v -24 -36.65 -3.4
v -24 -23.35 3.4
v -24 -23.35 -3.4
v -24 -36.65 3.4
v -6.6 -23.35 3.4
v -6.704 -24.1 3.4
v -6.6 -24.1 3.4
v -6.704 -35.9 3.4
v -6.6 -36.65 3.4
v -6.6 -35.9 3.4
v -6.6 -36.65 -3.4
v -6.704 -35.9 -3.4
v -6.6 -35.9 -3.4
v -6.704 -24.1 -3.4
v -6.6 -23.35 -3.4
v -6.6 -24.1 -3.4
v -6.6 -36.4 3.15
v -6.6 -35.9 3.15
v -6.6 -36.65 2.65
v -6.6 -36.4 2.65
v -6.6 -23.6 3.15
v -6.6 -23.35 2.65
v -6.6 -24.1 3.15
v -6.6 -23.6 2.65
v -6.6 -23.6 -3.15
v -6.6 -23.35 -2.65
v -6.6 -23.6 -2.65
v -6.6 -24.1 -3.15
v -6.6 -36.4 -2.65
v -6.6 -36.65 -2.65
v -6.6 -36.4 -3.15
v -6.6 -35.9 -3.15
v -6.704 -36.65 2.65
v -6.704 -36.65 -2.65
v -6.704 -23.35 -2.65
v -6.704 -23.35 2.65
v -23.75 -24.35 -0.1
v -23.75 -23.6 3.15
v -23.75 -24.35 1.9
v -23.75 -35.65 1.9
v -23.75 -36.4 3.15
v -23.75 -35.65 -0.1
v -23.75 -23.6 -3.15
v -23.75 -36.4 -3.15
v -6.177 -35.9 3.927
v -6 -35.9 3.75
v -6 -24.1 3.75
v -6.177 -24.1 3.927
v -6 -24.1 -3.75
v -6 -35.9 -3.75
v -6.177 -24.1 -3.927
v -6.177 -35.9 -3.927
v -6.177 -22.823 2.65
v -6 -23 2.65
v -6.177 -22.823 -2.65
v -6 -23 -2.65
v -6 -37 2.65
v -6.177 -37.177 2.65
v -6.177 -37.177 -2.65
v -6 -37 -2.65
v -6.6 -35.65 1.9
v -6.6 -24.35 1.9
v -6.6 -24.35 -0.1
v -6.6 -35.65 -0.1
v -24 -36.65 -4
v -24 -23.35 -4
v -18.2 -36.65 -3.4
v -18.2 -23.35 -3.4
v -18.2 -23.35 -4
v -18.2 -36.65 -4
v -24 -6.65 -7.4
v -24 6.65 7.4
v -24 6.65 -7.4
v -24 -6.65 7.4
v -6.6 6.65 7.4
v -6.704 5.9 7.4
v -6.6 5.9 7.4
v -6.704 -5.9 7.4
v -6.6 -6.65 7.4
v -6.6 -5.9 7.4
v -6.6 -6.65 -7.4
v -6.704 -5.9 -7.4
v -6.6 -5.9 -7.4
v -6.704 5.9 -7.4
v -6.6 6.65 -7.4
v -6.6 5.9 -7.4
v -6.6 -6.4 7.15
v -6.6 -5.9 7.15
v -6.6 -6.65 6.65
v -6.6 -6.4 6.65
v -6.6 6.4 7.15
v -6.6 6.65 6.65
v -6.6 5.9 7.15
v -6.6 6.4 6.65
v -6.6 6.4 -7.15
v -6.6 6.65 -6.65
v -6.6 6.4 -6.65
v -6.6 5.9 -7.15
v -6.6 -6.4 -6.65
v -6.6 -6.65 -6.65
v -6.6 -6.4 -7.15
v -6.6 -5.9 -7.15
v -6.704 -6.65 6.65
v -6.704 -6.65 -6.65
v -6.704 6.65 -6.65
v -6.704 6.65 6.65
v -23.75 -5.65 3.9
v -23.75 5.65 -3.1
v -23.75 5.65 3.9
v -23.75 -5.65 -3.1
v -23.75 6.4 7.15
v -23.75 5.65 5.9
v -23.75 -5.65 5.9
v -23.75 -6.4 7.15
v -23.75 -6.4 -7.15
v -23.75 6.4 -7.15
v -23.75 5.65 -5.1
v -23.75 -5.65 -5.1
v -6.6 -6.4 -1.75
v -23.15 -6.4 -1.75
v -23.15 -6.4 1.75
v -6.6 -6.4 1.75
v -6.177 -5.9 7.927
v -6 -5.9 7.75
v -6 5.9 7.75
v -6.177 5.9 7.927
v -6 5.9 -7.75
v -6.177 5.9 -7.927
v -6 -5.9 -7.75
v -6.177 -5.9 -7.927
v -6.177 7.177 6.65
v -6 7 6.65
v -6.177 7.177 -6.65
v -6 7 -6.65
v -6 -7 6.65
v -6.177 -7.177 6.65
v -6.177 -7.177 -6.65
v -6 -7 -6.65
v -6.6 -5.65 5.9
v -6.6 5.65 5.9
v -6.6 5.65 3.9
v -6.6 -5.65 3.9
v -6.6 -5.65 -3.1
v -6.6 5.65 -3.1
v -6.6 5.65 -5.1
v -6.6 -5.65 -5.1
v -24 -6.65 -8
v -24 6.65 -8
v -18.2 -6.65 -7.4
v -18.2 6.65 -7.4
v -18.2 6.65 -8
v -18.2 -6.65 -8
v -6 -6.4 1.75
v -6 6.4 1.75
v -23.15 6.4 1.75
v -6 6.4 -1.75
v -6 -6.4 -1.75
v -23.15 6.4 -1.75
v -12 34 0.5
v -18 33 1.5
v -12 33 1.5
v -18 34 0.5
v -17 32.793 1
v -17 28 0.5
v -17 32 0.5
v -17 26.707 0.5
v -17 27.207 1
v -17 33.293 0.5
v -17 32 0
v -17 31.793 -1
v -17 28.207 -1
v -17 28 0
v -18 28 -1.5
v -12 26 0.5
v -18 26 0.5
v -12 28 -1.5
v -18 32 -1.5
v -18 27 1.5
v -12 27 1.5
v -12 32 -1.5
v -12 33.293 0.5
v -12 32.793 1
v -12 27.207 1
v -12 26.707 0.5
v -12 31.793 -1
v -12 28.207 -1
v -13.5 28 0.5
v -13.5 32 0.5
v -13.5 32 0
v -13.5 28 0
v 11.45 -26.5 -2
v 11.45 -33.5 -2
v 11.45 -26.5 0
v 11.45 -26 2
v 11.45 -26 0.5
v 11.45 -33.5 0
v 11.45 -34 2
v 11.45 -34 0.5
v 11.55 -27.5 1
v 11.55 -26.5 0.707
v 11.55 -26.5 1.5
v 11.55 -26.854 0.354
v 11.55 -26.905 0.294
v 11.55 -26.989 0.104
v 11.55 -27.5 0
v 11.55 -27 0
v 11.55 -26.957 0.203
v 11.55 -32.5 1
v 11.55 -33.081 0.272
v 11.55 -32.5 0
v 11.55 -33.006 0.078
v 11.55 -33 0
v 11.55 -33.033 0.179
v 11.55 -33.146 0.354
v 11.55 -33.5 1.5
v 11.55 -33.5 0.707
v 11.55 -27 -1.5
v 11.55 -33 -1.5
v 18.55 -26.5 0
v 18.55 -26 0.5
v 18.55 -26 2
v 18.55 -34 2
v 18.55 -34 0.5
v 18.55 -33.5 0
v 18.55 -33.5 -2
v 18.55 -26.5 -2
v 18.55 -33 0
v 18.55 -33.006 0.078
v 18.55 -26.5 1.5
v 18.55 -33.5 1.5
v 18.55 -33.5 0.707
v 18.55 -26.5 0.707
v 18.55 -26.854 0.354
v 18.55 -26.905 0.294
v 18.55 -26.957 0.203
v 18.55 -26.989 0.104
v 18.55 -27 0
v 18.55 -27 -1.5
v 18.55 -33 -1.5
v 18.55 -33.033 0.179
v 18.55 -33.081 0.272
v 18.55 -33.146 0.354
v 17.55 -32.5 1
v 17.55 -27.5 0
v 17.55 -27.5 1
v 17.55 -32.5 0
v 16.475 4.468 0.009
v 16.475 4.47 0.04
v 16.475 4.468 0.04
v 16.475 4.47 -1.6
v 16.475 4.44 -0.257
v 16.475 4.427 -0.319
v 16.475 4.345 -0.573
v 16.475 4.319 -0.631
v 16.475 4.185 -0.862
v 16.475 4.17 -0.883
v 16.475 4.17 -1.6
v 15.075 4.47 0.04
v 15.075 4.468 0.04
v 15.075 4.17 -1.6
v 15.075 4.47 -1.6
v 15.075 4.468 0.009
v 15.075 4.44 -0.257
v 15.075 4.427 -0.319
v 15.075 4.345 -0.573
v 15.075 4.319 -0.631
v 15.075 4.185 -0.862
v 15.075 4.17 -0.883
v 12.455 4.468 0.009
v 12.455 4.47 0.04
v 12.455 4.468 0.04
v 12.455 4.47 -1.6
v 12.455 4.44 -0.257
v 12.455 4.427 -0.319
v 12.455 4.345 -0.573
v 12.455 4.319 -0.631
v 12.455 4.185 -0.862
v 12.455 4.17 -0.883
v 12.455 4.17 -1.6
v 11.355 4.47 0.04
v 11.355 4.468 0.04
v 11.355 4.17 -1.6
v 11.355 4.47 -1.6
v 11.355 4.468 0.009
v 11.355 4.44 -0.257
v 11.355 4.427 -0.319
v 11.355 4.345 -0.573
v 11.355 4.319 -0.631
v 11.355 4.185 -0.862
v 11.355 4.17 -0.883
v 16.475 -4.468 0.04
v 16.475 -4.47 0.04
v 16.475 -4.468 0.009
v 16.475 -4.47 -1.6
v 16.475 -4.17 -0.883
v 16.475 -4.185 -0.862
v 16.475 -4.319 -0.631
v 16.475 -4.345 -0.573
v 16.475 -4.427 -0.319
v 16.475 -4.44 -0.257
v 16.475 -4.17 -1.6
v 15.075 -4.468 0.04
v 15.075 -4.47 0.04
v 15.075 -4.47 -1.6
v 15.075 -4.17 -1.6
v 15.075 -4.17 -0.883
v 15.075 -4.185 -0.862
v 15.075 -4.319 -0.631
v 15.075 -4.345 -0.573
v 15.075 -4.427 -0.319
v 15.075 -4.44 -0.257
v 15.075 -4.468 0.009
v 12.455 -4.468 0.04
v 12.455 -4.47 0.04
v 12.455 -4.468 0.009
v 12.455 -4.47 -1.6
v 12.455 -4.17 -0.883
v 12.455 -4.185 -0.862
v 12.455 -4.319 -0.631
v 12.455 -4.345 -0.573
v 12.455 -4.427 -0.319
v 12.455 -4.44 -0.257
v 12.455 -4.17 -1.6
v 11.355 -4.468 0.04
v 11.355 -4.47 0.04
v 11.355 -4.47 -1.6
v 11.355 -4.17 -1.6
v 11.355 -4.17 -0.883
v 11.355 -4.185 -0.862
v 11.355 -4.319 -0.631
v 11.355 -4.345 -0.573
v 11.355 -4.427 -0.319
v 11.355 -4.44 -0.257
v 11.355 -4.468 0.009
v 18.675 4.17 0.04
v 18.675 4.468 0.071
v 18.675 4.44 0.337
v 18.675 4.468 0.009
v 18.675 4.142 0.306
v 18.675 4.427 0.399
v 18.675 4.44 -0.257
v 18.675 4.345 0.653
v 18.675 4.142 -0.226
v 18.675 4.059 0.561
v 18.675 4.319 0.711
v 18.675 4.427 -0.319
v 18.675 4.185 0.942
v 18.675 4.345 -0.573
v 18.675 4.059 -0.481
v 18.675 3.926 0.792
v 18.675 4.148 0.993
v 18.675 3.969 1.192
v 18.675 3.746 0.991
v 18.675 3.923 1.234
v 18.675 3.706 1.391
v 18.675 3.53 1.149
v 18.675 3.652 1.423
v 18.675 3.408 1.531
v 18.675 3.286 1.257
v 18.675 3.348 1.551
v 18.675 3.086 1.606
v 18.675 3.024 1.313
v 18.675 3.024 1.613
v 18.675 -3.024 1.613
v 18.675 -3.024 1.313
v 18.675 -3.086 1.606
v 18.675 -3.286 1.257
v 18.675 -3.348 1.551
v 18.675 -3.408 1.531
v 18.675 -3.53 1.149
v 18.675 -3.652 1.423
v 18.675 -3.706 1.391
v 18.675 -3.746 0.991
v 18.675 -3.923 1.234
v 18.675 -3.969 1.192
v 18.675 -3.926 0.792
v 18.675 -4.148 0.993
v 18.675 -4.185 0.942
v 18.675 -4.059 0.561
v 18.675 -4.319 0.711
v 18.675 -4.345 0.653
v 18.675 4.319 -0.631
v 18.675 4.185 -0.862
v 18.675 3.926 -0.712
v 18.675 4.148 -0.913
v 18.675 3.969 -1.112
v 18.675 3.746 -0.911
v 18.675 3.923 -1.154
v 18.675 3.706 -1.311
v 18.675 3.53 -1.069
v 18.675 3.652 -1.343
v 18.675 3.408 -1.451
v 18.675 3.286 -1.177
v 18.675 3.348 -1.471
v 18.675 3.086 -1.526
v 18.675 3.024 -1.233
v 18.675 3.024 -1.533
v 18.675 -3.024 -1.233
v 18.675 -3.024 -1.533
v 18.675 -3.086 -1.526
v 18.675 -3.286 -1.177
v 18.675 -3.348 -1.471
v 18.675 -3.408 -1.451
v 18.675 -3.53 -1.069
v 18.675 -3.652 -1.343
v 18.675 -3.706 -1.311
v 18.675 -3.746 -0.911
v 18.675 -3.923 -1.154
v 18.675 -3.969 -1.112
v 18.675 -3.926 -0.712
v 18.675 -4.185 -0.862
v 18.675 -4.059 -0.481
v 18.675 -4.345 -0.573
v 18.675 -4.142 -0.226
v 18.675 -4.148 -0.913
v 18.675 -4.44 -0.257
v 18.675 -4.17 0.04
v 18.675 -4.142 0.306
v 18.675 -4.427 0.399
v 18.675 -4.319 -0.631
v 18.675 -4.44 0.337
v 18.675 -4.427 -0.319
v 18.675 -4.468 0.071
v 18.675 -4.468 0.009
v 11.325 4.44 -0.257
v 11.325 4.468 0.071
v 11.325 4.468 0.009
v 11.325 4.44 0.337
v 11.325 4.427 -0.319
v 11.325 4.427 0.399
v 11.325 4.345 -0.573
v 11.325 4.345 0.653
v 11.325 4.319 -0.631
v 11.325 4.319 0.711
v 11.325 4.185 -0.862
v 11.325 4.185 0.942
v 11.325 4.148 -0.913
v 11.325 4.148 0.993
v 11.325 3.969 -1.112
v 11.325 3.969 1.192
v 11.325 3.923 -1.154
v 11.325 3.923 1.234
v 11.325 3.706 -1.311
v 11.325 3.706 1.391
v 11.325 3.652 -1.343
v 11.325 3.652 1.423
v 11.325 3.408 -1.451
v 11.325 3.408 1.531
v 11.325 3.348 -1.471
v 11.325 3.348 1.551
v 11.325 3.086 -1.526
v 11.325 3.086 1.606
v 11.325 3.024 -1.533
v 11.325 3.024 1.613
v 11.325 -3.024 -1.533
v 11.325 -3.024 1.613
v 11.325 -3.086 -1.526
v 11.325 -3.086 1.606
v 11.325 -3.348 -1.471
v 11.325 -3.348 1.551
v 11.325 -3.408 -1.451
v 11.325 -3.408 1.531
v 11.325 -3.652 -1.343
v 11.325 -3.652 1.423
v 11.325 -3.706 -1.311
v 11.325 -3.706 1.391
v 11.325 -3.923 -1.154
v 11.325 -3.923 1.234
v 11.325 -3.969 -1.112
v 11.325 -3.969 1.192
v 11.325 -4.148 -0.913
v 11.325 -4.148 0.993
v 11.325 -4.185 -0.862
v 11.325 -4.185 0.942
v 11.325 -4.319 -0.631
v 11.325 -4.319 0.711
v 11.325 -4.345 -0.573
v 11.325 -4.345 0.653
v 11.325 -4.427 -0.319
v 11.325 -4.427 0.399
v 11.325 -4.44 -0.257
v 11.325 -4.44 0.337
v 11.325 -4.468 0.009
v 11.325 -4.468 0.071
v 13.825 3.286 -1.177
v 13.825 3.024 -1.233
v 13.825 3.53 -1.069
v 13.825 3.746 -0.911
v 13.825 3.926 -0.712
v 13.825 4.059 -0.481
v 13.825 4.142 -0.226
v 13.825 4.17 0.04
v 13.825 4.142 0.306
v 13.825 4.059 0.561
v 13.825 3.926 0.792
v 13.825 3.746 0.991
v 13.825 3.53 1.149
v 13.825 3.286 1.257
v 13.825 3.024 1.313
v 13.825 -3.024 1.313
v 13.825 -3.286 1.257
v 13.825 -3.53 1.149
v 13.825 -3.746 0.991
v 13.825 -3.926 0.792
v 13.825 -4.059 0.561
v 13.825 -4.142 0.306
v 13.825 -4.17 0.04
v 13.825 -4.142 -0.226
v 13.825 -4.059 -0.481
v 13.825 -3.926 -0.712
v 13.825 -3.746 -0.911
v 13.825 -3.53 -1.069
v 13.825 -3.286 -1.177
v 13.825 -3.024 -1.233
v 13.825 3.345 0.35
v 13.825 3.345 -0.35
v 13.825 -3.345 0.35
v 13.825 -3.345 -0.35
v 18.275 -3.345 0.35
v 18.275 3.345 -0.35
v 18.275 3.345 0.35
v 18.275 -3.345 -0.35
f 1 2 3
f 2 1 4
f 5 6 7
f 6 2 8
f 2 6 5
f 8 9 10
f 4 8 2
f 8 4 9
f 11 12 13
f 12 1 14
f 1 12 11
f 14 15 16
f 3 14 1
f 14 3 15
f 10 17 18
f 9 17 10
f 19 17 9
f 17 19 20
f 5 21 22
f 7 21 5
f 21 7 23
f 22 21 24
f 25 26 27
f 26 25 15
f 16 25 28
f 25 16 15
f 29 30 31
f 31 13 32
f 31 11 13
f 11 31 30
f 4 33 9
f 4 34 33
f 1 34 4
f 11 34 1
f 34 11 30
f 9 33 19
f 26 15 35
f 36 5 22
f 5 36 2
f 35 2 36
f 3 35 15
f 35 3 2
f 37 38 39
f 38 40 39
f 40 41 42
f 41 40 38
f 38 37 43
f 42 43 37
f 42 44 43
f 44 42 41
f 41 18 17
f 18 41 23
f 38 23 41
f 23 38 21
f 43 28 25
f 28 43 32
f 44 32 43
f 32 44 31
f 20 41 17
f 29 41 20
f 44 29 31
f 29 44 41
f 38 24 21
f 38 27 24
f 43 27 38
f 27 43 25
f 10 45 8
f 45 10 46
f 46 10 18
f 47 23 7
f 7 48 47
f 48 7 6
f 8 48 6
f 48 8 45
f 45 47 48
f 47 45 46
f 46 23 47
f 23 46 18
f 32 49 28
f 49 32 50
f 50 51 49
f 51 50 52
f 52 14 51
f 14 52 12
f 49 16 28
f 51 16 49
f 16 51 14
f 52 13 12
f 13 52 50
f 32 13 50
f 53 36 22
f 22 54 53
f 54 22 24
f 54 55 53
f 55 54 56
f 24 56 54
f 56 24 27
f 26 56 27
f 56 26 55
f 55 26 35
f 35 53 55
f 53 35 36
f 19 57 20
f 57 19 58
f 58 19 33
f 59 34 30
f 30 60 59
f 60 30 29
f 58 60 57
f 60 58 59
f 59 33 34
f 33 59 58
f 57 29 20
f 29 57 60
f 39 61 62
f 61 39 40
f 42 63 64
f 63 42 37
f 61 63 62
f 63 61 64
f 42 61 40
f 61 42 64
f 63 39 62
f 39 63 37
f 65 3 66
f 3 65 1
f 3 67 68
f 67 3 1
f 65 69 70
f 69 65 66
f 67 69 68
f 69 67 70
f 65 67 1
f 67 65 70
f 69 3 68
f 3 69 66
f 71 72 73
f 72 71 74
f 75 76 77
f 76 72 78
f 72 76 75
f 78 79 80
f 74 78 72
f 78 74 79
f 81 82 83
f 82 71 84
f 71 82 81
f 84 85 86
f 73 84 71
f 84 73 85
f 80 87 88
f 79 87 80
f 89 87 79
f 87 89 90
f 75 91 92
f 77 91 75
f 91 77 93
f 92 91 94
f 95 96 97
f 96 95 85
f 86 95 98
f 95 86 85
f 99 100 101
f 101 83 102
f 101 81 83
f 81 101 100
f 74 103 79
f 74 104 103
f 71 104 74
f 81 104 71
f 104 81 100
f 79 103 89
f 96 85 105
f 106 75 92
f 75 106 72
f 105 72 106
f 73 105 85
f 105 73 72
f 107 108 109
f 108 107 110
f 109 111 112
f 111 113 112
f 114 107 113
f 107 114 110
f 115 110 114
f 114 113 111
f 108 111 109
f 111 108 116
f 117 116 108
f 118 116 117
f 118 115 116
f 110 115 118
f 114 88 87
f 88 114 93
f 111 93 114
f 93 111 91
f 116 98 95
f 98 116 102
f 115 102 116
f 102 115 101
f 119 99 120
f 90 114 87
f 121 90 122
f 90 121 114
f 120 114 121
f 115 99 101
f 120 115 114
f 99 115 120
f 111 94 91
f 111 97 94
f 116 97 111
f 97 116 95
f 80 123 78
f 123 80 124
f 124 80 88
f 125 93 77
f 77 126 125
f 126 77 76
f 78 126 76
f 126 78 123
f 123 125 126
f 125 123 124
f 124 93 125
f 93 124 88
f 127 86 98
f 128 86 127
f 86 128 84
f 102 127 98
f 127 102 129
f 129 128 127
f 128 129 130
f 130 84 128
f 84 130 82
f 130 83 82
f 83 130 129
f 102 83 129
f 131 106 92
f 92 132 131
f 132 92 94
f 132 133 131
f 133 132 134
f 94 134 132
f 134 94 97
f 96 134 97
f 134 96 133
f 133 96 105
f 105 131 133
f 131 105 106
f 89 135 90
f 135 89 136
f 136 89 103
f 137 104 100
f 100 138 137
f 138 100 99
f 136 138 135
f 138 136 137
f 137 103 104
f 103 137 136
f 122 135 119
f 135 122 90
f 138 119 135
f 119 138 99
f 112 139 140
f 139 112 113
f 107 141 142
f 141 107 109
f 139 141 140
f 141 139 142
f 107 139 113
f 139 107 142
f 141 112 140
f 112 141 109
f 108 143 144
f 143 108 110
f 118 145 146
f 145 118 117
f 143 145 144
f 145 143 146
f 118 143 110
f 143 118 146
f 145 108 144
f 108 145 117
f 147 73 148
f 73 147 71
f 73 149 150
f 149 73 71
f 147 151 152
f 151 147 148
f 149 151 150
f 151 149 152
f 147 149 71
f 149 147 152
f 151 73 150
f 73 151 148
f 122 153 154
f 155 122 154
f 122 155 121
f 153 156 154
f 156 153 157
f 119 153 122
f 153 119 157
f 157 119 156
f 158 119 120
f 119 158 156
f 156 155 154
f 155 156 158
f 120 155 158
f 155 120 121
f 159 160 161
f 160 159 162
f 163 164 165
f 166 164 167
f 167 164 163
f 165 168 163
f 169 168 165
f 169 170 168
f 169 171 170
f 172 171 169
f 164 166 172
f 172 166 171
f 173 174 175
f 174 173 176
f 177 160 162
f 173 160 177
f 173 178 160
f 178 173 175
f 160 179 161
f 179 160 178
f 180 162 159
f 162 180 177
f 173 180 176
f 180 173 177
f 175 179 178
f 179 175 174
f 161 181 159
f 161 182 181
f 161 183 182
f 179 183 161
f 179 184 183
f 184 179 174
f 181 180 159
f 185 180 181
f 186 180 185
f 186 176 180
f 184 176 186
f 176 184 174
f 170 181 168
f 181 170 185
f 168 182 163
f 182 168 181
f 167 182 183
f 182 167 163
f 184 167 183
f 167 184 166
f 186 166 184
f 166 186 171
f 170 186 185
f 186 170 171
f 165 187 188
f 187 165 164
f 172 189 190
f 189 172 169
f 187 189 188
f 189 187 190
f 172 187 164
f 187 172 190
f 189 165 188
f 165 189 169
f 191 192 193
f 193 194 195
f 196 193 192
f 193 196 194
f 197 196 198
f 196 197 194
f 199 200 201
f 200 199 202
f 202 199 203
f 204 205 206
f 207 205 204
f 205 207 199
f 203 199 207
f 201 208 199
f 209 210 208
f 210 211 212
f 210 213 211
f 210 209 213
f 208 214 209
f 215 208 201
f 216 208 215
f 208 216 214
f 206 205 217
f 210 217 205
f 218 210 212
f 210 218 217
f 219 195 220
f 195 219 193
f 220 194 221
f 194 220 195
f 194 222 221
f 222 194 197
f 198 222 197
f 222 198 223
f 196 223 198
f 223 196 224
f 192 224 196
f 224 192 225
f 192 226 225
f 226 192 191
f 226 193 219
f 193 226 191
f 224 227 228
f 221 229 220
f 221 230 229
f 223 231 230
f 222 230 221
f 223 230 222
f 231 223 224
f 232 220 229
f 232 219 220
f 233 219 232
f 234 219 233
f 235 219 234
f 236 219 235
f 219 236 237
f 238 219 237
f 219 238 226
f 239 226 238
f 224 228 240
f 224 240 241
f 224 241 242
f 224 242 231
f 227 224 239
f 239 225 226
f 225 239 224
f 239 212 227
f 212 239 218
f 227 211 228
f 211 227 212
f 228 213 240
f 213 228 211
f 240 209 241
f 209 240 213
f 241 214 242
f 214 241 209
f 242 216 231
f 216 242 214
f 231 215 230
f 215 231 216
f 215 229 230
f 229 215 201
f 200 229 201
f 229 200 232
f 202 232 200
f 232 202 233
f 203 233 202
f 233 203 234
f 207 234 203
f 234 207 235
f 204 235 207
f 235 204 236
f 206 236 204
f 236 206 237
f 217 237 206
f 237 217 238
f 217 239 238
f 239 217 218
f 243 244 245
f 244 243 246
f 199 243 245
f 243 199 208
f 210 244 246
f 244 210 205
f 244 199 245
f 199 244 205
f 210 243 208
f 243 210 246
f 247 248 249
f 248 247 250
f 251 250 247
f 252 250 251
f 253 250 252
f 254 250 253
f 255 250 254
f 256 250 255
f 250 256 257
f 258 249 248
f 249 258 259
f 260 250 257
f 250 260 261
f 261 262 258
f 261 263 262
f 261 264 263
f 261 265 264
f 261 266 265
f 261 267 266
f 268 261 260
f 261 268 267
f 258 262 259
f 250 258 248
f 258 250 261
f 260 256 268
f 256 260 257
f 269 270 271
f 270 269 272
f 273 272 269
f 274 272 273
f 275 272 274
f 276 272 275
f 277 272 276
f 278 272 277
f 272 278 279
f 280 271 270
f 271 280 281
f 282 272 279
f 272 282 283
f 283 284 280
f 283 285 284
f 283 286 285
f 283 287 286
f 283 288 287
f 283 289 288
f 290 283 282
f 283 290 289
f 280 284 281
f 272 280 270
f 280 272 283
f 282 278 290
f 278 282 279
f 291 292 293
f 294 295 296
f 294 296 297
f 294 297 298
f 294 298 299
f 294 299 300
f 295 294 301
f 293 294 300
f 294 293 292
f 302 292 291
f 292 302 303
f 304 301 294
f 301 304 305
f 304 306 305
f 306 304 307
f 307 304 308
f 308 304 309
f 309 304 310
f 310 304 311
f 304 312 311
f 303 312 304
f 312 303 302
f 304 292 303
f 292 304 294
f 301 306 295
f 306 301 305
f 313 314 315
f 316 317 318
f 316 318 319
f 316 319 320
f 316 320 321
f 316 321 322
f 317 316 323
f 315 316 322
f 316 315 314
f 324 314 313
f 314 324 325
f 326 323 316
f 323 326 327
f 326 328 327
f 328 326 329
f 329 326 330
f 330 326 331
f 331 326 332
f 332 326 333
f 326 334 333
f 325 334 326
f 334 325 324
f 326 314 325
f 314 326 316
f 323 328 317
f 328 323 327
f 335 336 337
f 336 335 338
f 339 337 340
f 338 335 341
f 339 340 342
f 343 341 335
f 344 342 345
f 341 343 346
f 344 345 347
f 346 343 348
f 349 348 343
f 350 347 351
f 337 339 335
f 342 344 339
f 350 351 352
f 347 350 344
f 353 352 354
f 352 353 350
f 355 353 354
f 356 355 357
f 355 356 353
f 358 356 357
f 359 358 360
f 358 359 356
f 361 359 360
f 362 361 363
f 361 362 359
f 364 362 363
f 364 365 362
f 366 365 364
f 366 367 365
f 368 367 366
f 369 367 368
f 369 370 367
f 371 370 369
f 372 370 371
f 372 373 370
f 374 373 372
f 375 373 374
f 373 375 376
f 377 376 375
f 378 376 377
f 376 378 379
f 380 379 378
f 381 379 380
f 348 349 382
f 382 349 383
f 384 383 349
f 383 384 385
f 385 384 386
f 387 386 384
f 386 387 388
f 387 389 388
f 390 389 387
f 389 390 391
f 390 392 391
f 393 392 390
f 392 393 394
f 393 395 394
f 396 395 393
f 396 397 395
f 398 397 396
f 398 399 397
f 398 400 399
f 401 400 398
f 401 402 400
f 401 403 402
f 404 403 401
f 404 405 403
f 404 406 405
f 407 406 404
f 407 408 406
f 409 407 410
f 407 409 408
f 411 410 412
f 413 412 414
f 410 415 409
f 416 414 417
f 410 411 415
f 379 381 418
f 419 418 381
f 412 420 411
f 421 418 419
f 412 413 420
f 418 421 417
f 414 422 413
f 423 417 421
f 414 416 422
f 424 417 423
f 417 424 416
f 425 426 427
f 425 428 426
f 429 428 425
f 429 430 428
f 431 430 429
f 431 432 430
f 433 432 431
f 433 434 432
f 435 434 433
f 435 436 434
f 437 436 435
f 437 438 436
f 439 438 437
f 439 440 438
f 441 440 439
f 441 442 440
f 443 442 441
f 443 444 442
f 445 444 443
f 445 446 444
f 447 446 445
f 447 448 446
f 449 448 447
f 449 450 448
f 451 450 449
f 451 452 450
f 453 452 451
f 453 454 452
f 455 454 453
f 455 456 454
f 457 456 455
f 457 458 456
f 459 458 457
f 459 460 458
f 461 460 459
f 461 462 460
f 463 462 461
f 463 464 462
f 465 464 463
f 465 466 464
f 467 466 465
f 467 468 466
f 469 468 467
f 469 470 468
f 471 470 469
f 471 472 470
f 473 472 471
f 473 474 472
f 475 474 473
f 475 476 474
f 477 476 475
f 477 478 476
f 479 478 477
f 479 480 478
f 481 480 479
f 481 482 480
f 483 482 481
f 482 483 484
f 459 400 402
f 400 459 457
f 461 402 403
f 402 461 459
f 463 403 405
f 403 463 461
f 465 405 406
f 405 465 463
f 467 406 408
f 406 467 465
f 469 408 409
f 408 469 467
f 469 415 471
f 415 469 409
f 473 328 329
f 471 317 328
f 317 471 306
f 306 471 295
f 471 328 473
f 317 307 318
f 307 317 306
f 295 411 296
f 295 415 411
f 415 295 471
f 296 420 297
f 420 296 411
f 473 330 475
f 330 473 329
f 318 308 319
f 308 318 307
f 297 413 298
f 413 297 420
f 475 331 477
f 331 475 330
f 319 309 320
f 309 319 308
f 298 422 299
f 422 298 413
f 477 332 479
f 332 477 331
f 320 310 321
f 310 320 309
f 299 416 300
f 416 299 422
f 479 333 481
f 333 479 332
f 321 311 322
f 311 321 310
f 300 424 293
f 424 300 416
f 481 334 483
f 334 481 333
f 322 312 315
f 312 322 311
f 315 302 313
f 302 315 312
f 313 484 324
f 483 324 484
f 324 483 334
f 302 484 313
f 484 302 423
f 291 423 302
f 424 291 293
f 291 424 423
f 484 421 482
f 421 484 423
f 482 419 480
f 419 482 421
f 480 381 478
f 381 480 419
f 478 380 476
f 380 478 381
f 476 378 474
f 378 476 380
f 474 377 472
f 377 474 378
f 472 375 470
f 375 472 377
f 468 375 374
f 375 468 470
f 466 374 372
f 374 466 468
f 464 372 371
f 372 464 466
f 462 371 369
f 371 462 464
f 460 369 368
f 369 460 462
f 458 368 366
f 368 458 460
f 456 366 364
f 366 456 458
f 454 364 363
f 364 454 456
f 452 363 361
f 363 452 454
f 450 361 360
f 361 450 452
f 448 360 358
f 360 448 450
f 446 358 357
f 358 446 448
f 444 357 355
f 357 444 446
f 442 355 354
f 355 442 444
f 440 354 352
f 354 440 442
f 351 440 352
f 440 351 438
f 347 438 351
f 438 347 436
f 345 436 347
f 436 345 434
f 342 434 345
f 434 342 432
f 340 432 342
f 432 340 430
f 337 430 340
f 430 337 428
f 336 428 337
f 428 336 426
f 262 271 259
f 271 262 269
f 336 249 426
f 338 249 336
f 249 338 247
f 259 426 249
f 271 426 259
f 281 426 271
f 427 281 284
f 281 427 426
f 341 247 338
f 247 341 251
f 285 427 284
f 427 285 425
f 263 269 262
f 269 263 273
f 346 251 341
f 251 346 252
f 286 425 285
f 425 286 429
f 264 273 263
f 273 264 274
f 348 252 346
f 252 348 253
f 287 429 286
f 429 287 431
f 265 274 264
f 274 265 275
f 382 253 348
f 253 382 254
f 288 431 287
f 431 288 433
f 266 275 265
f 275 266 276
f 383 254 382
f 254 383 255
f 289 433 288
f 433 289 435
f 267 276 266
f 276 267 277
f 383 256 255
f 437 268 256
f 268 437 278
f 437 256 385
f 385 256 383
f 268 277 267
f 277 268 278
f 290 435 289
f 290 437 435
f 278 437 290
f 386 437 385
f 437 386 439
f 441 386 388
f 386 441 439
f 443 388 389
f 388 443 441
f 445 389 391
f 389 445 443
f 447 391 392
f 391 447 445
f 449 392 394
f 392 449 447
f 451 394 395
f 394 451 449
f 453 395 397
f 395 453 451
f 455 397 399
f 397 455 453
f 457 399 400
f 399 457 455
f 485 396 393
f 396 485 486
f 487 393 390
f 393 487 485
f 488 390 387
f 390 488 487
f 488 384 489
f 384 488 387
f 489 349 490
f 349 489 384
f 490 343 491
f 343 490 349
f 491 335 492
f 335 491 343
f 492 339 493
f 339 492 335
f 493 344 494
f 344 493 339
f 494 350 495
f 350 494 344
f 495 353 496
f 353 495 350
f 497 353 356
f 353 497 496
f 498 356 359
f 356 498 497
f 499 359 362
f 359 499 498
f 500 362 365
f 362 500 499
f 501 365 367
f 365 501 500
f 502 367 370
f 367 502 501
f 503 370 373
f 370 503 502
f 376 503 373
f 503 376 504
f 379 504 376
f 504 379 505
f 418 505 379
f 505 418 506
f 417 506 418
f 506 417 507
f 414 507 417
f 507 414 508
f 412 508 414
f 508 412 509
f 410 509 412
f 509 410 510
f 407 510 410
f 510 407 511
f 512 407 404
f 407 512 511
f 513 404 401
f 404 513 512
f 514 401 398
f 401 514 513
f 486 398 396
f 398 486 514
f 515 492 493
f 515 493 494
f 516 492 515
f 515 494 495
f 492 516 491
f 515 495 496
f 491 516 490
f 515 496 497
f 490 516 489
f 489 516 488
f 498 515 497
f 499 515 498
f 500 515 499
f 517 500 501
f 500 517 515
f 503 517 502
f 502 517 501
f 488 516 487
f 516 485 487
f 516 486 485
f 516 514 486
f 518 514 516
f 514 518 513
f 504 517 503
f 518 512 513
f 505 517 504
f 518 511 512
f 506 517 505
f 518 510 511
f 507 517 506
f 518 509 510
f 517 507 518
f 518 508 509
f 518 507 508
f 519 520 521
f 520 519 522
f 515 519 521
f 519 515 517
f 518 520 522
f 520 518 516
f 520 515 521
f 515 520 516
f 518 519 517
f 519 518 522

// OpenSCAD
// file: ../globals.scad
// Copyright (c) 2017 Clément Bœsch <u pkh.me>
//
// Permission to use, copy, modify, and distribute this software for any
// purpose with or without fee is hereby granted, provided that the above
// copyright notice and this permission notice appear in all copies.
//
// THE SOFTWARE IS PROVIDED "AS IS" AND THE AUTHOR DISCLAIMS ALL WARRANTIES
// WITH REGARD TO THIS SOFTWARE INCLUDING ALL IMPLIED WARRANTIES OF
// MERCHANTABILITY AND FITNESS. IN NO EVENT SHALL THE AUTHOR BE LIABLE FOR
// ANY SPECIAL, DIRECT, INDIRECT, OR CONSEQUENTIAL DAMAGES OR ANY DAMAGES
// WHATSOEVER RESULTING FROM LOSS OF USE, DATA OR PROFITS, WHETHER IN AN
// ACTION OF CONTRACT, NEGLIGENCE OR OTHER TORTIOUS ACTION, ARISING OUT OF
// OR IN CONNECTION WITH THE USE OR PERFORMANCE OF THIS SOFTWARE.

$fn = 30;

_delta = 0.005;

c_black        = [.17,.17,.17];
c_black_redish = [.35,.30,.30];
c_gold         = [.75,.55,.00];
c_gray         = [.40,.40,.40];
c_darkgray     = [.25,.25,.25];
c_green_pcb    = [.00,.50,.25];
c_metal        = [.70,.70,.70];
c_yellow       = [.70,.70,.30];
c_darkblue     = [.20,.30,.40];
c_usb_blue     = [.20,.60,  1];
// file: _internal.scad
// Copyright (c) 2017 Clément Bœsch <u pkh.me>
//
// Permission to use, copy, modify, and distribute this software for any
// purpose with or without fee is hereby granted, provided that the above
// copyright notice and this permission notice appear in all copies.
//
// THE SOFTWARE IS PROVIDED "AS IS" AND THE AUTHOR DISCLAIMS ALL WARRANTIES
// WITH REGARD TO THIS SOFTWARE INCLUDING ALL IMPLIED WARRANTIES OF
// MERCHANTABILITY AND FITNESS. IN NO EVENT SHALL THE AUTHOR BE LIABLE FOR
// ANY SPECIAL, DIRECT, INDIRECT, OR CONSEQUENTIAL DAMAGES OR ANY DAMAGES
// WHATSOEVER RESULTING FROM LOSS OF USE, DATA OR PROFITS, WHETHER IN AN
// ACTION OF CONTRACT, NEGLIGENCE OR OTHER TORTIOUS ACTION, ARISING OUT OF
// OR IN CONNECTION WITH THE USE OR PERFORMANCE OF THIS SOFTWARE.

include <../globals.scad>

$vpr = [50, 0, 90];

module components_demo(pad=30) {
    n = $children;
    cols = ceil(sqrt(n));
    rows = ceil(n / cols);
    offx = pad * (rows - 1) / 2;
    offy = pad * (cols - 1) / 2;
    for (i = [0:n-1]) {
        x = floor(i / cols);
        y = i % cols;
        translate([x*pad - offx, y*pad - offy])
            rotate(360 * $t)
                children(i);
    }
}
// main file
// Copyright (c) 2017 Clément Bœsch <u pkh.me>
//
// Permission to use, copy, modify, and distribute this software for any
// purpose with or without fee is hereby granted, provided that the above
// copyright notice and this permission notice appear in all copies.
//
// THE SOFTWARE IS PROVIDED "AS IS" AND THE AUTHOR DISCLAIMS ALL WARRANTIES
// WITH REGARD TO THIS SOFTWARE INCLUDING ALL IMPLIED WARRANTIES OF
// MERCHANTABILITY AND FITNESS. IN NO EVENT SHALL THE AUTHOR BE LIABLE FOR
// ANY SPECIAL, DIRECT, INDIRECT, OR CONSEQUENTIAL DAMAGES OR ANY DAMAGES
// WHATSOEVER RESULTING FROM LOSS OF USE, DATA OR PROFITS, WHETHER IN AN
// ACTION OF CONTRACT, NEGLIGENCE OR OTHER TORTIOUS ACTION, ARISING OUT OF
// OR IN CONNECTION WITH THE USE OR PERFORMANCE OF THIS SOFTWARE.

include <_internal.scad>

$vpd = 150;

module usb(dim=[18, 14.5, 8], n=1, clr="white", has_folding=true) {
    pin_l = has_folding ? .6 : 0;

    l = dim[0] - pin_l;
    w = dim[1] - pin_l*2;
    h = dim[2] - pin_l*2;

    t = 0.25;
    p = 0.75;
    z = pin_l * sqrt(2);

    rotate([0, 0, 180]) translate(dim * -.5) { // XXX
        translate([pin_l, pin_l, pin_l]) {
            color(c_metal) {
                difference() {
                    cube([l, w, h]);
                    translate([-_delta, t, t])
                        cube([l-t+_delta, w-t*2, h-t*2]);
                }
                if (has_folding) {
                    translate([0,   p, h-t]) rotate(a= 45, v=[0,1,0]) translate([-z,  0,  0]) cube([z, w - 2*p,       t]);
                    translate([0,   p,   t]) rotate(a=-45, v=[0,1,0]) translate([-z,  0, -t]) cube([z, w - 2*p,       t]);
                    translate([0,   t,   p]) rotate(a= 45, v=[0,0,1]) translate([-z, -t,  0]) cube([z,       t, h - 2*p]);
                    translate([0, w-t,   p]) rotate(a=-45, v=[0,0,1]) translate([-z,  0,  0]) cube([z,       t, h - 2*p]);
                }
            }
            color(clr)
                for (y = [0:n-1])
                    translate([0, 1, h-(3.5+9*y)]) // XXX: random shit
                        cube([l-t, w-2, 2]);
        }
        color(c_metal)
            translate([pin_l+l-l/3, pin_l])
                cube([l/3, w, pin_l]);
    }
}

module usbx2(dim=[18, 14.5, 16], clr=c_black, has_folding=true) {
    usb(dim, n=2, clr=clr, has_folding=has_folding);

    // separator (XXX: random shit)
    pin_l = has_folding ? .6 : 0;
    t = 0.25;
    l = dim[0] - pin_l - t;
    w = dim[1] - pin_l*2 - t*2;
    rotate([0, 0, 180]) translate(dim * -.5) // XXX
        color(c_metal)
            translate([0, (dim[1]-w)/2, (dim[2]-3.5)/2])
                cube([l, w, 3.5]);
}

module microusb(dim=[6, 8, 3]) {
    jack_dim = [6, 8, 3];
    l = jack_dim[0];
    w = jack_dim[1];
    h = jack_dim[2];
    microusb_polygon_pos = [[1, h], [w-1, h], [w, h-1],
                            [w-2, 0], [2, 0], [0, h-1]];
    p_w = dim[1];
    p_h = dim[2];
    rotate([0, 0, 180]) translate(jack_dim * -.5) { // XXX
        color(c_metal) {
            translate([l-1,0,0]) rotate([90, 0, 90]) linear_extrude(1)
                polygon(microusb_polygon_pos);
            rotate([90, 0, 90]) {
                linear_extrude(height=l-1) {
                    difference() {
                        polygon(microusb_polygon_pos);
                        offset(r=-.5)
                            polygon(microusb_polygon_pos);
                    }
                }
            }
        }
        color(c_black)
            translate([1.5, (w-4)/2, h-1.5])
                cube([l-2.5, 4, .5]);
    }
}


module miniusb(dim=[7.1, 8, 4]) {
    // TODO: merge with microusb (XXX: HDMI?)
    l = dim[0];
    w = dim[1];
    h = dim[2];
    lowest = h - 4;
    depth = 7;
    otg_polygon_pos = [[0, h], [w, h], [w, h-1.5], [w-.5, h-2],
                       [w-.5, lowest], [.5, lowest], [.5, h-2],
                       [0, h-1.5]];
    translate(dim * -.5) { // XXX
    color(c_metal) {
        rotate([90, 0, 90]) linear_extrude(l-depth)
            polygon(otg_polygon_pos);
        translate([l-depth, 0, 0]) {
            rotate([90, 0, 90]) {
                linear_extrude(height=depth) {
                    difference() {
                        polygon(otg_polygon_pos);
                        offset(r=-.5)
                            polygon(otg_polygon_pos);
                    }
                }
            }
        }
    }
    color(c_black)
        translate([l-depth, 1.5, 2])
            cube([6, w-3, 1]);
    }
}

module usbc_inner_profile(d,sep) {
  hull() {
      translate([-sep/2,0]) circle(d=d);
      translate([ sep/2,0]) circle(d=d);
  }
}

// VALCON CSP-USC16-TR on RPi4
module usbc(dim=[7.35, 8.94, 3.2], th=0.3) {
    d2 = 2.56; // usb-c spec inner receptacle height
    l = dim[0];
    w = dim[1];
    h = dim[2];

    d = d2 + 2*th; // outer height/diameter
    zoff = h-d;

    sep = 8.34-d2;

    l_leg1 = 1.4;
    l_leg2 = 1.1;
    h_leg = h/2;

    recess_tab = 0.4;
    l_tab = l-recess_tab;
    w_tab = 6.69;
    h_tab = 0.7;
    l_plug = 2.5;
  
    translate([l/2,0,0]) {
        color(c_black)
            translate([-l_tab-recess_tab,-w_tab/2,-h_tab/2]) 
                cube([l_tab,w_tab,h_tab]);
        union() {
            color(c_metal) for(i=[0,1]) mirror([0,i,0]) {
                translate([-l_leg1-2.20,w/2-th,-h_leg]) cube([l_leg1,th,h_leg+zoff]);
                translate([-l_leg2-6.22,w/2-th,-h_leg]) cube([l_leg2,th,h_leg+zoff]);
            }
            translate([0,0,zoff]) rotate([90,0,-90]) {
                color(c_metal) linear_extrude(height=l) difference() {
                    offset(th) usbc_inner_profile(d2, sep);
                    usbc_inner_profile(d2, sep);
                }
                color(c_black) translate([0,0,l-l_plug]) linear_extrude(height=l_plug) 
                    usbc_inner_profile(d2, sep);
            }
        }
    }
}

function usb_info() = [
    ["category", "usb"],
    ["watch", "horizon"],
];
function usbx2_info()    = usb_info();
function microusb_info() = usb_info();
function miniusb_info()  = usb_info();
function usbc_info()     = usb_info();

// easier to keep in view with rows first for 5 components
components_demo(pad=30, rowsfirst=true) {
    usb();
    usbx2();
    microusb();
    miniusb();
    usbc();
}
